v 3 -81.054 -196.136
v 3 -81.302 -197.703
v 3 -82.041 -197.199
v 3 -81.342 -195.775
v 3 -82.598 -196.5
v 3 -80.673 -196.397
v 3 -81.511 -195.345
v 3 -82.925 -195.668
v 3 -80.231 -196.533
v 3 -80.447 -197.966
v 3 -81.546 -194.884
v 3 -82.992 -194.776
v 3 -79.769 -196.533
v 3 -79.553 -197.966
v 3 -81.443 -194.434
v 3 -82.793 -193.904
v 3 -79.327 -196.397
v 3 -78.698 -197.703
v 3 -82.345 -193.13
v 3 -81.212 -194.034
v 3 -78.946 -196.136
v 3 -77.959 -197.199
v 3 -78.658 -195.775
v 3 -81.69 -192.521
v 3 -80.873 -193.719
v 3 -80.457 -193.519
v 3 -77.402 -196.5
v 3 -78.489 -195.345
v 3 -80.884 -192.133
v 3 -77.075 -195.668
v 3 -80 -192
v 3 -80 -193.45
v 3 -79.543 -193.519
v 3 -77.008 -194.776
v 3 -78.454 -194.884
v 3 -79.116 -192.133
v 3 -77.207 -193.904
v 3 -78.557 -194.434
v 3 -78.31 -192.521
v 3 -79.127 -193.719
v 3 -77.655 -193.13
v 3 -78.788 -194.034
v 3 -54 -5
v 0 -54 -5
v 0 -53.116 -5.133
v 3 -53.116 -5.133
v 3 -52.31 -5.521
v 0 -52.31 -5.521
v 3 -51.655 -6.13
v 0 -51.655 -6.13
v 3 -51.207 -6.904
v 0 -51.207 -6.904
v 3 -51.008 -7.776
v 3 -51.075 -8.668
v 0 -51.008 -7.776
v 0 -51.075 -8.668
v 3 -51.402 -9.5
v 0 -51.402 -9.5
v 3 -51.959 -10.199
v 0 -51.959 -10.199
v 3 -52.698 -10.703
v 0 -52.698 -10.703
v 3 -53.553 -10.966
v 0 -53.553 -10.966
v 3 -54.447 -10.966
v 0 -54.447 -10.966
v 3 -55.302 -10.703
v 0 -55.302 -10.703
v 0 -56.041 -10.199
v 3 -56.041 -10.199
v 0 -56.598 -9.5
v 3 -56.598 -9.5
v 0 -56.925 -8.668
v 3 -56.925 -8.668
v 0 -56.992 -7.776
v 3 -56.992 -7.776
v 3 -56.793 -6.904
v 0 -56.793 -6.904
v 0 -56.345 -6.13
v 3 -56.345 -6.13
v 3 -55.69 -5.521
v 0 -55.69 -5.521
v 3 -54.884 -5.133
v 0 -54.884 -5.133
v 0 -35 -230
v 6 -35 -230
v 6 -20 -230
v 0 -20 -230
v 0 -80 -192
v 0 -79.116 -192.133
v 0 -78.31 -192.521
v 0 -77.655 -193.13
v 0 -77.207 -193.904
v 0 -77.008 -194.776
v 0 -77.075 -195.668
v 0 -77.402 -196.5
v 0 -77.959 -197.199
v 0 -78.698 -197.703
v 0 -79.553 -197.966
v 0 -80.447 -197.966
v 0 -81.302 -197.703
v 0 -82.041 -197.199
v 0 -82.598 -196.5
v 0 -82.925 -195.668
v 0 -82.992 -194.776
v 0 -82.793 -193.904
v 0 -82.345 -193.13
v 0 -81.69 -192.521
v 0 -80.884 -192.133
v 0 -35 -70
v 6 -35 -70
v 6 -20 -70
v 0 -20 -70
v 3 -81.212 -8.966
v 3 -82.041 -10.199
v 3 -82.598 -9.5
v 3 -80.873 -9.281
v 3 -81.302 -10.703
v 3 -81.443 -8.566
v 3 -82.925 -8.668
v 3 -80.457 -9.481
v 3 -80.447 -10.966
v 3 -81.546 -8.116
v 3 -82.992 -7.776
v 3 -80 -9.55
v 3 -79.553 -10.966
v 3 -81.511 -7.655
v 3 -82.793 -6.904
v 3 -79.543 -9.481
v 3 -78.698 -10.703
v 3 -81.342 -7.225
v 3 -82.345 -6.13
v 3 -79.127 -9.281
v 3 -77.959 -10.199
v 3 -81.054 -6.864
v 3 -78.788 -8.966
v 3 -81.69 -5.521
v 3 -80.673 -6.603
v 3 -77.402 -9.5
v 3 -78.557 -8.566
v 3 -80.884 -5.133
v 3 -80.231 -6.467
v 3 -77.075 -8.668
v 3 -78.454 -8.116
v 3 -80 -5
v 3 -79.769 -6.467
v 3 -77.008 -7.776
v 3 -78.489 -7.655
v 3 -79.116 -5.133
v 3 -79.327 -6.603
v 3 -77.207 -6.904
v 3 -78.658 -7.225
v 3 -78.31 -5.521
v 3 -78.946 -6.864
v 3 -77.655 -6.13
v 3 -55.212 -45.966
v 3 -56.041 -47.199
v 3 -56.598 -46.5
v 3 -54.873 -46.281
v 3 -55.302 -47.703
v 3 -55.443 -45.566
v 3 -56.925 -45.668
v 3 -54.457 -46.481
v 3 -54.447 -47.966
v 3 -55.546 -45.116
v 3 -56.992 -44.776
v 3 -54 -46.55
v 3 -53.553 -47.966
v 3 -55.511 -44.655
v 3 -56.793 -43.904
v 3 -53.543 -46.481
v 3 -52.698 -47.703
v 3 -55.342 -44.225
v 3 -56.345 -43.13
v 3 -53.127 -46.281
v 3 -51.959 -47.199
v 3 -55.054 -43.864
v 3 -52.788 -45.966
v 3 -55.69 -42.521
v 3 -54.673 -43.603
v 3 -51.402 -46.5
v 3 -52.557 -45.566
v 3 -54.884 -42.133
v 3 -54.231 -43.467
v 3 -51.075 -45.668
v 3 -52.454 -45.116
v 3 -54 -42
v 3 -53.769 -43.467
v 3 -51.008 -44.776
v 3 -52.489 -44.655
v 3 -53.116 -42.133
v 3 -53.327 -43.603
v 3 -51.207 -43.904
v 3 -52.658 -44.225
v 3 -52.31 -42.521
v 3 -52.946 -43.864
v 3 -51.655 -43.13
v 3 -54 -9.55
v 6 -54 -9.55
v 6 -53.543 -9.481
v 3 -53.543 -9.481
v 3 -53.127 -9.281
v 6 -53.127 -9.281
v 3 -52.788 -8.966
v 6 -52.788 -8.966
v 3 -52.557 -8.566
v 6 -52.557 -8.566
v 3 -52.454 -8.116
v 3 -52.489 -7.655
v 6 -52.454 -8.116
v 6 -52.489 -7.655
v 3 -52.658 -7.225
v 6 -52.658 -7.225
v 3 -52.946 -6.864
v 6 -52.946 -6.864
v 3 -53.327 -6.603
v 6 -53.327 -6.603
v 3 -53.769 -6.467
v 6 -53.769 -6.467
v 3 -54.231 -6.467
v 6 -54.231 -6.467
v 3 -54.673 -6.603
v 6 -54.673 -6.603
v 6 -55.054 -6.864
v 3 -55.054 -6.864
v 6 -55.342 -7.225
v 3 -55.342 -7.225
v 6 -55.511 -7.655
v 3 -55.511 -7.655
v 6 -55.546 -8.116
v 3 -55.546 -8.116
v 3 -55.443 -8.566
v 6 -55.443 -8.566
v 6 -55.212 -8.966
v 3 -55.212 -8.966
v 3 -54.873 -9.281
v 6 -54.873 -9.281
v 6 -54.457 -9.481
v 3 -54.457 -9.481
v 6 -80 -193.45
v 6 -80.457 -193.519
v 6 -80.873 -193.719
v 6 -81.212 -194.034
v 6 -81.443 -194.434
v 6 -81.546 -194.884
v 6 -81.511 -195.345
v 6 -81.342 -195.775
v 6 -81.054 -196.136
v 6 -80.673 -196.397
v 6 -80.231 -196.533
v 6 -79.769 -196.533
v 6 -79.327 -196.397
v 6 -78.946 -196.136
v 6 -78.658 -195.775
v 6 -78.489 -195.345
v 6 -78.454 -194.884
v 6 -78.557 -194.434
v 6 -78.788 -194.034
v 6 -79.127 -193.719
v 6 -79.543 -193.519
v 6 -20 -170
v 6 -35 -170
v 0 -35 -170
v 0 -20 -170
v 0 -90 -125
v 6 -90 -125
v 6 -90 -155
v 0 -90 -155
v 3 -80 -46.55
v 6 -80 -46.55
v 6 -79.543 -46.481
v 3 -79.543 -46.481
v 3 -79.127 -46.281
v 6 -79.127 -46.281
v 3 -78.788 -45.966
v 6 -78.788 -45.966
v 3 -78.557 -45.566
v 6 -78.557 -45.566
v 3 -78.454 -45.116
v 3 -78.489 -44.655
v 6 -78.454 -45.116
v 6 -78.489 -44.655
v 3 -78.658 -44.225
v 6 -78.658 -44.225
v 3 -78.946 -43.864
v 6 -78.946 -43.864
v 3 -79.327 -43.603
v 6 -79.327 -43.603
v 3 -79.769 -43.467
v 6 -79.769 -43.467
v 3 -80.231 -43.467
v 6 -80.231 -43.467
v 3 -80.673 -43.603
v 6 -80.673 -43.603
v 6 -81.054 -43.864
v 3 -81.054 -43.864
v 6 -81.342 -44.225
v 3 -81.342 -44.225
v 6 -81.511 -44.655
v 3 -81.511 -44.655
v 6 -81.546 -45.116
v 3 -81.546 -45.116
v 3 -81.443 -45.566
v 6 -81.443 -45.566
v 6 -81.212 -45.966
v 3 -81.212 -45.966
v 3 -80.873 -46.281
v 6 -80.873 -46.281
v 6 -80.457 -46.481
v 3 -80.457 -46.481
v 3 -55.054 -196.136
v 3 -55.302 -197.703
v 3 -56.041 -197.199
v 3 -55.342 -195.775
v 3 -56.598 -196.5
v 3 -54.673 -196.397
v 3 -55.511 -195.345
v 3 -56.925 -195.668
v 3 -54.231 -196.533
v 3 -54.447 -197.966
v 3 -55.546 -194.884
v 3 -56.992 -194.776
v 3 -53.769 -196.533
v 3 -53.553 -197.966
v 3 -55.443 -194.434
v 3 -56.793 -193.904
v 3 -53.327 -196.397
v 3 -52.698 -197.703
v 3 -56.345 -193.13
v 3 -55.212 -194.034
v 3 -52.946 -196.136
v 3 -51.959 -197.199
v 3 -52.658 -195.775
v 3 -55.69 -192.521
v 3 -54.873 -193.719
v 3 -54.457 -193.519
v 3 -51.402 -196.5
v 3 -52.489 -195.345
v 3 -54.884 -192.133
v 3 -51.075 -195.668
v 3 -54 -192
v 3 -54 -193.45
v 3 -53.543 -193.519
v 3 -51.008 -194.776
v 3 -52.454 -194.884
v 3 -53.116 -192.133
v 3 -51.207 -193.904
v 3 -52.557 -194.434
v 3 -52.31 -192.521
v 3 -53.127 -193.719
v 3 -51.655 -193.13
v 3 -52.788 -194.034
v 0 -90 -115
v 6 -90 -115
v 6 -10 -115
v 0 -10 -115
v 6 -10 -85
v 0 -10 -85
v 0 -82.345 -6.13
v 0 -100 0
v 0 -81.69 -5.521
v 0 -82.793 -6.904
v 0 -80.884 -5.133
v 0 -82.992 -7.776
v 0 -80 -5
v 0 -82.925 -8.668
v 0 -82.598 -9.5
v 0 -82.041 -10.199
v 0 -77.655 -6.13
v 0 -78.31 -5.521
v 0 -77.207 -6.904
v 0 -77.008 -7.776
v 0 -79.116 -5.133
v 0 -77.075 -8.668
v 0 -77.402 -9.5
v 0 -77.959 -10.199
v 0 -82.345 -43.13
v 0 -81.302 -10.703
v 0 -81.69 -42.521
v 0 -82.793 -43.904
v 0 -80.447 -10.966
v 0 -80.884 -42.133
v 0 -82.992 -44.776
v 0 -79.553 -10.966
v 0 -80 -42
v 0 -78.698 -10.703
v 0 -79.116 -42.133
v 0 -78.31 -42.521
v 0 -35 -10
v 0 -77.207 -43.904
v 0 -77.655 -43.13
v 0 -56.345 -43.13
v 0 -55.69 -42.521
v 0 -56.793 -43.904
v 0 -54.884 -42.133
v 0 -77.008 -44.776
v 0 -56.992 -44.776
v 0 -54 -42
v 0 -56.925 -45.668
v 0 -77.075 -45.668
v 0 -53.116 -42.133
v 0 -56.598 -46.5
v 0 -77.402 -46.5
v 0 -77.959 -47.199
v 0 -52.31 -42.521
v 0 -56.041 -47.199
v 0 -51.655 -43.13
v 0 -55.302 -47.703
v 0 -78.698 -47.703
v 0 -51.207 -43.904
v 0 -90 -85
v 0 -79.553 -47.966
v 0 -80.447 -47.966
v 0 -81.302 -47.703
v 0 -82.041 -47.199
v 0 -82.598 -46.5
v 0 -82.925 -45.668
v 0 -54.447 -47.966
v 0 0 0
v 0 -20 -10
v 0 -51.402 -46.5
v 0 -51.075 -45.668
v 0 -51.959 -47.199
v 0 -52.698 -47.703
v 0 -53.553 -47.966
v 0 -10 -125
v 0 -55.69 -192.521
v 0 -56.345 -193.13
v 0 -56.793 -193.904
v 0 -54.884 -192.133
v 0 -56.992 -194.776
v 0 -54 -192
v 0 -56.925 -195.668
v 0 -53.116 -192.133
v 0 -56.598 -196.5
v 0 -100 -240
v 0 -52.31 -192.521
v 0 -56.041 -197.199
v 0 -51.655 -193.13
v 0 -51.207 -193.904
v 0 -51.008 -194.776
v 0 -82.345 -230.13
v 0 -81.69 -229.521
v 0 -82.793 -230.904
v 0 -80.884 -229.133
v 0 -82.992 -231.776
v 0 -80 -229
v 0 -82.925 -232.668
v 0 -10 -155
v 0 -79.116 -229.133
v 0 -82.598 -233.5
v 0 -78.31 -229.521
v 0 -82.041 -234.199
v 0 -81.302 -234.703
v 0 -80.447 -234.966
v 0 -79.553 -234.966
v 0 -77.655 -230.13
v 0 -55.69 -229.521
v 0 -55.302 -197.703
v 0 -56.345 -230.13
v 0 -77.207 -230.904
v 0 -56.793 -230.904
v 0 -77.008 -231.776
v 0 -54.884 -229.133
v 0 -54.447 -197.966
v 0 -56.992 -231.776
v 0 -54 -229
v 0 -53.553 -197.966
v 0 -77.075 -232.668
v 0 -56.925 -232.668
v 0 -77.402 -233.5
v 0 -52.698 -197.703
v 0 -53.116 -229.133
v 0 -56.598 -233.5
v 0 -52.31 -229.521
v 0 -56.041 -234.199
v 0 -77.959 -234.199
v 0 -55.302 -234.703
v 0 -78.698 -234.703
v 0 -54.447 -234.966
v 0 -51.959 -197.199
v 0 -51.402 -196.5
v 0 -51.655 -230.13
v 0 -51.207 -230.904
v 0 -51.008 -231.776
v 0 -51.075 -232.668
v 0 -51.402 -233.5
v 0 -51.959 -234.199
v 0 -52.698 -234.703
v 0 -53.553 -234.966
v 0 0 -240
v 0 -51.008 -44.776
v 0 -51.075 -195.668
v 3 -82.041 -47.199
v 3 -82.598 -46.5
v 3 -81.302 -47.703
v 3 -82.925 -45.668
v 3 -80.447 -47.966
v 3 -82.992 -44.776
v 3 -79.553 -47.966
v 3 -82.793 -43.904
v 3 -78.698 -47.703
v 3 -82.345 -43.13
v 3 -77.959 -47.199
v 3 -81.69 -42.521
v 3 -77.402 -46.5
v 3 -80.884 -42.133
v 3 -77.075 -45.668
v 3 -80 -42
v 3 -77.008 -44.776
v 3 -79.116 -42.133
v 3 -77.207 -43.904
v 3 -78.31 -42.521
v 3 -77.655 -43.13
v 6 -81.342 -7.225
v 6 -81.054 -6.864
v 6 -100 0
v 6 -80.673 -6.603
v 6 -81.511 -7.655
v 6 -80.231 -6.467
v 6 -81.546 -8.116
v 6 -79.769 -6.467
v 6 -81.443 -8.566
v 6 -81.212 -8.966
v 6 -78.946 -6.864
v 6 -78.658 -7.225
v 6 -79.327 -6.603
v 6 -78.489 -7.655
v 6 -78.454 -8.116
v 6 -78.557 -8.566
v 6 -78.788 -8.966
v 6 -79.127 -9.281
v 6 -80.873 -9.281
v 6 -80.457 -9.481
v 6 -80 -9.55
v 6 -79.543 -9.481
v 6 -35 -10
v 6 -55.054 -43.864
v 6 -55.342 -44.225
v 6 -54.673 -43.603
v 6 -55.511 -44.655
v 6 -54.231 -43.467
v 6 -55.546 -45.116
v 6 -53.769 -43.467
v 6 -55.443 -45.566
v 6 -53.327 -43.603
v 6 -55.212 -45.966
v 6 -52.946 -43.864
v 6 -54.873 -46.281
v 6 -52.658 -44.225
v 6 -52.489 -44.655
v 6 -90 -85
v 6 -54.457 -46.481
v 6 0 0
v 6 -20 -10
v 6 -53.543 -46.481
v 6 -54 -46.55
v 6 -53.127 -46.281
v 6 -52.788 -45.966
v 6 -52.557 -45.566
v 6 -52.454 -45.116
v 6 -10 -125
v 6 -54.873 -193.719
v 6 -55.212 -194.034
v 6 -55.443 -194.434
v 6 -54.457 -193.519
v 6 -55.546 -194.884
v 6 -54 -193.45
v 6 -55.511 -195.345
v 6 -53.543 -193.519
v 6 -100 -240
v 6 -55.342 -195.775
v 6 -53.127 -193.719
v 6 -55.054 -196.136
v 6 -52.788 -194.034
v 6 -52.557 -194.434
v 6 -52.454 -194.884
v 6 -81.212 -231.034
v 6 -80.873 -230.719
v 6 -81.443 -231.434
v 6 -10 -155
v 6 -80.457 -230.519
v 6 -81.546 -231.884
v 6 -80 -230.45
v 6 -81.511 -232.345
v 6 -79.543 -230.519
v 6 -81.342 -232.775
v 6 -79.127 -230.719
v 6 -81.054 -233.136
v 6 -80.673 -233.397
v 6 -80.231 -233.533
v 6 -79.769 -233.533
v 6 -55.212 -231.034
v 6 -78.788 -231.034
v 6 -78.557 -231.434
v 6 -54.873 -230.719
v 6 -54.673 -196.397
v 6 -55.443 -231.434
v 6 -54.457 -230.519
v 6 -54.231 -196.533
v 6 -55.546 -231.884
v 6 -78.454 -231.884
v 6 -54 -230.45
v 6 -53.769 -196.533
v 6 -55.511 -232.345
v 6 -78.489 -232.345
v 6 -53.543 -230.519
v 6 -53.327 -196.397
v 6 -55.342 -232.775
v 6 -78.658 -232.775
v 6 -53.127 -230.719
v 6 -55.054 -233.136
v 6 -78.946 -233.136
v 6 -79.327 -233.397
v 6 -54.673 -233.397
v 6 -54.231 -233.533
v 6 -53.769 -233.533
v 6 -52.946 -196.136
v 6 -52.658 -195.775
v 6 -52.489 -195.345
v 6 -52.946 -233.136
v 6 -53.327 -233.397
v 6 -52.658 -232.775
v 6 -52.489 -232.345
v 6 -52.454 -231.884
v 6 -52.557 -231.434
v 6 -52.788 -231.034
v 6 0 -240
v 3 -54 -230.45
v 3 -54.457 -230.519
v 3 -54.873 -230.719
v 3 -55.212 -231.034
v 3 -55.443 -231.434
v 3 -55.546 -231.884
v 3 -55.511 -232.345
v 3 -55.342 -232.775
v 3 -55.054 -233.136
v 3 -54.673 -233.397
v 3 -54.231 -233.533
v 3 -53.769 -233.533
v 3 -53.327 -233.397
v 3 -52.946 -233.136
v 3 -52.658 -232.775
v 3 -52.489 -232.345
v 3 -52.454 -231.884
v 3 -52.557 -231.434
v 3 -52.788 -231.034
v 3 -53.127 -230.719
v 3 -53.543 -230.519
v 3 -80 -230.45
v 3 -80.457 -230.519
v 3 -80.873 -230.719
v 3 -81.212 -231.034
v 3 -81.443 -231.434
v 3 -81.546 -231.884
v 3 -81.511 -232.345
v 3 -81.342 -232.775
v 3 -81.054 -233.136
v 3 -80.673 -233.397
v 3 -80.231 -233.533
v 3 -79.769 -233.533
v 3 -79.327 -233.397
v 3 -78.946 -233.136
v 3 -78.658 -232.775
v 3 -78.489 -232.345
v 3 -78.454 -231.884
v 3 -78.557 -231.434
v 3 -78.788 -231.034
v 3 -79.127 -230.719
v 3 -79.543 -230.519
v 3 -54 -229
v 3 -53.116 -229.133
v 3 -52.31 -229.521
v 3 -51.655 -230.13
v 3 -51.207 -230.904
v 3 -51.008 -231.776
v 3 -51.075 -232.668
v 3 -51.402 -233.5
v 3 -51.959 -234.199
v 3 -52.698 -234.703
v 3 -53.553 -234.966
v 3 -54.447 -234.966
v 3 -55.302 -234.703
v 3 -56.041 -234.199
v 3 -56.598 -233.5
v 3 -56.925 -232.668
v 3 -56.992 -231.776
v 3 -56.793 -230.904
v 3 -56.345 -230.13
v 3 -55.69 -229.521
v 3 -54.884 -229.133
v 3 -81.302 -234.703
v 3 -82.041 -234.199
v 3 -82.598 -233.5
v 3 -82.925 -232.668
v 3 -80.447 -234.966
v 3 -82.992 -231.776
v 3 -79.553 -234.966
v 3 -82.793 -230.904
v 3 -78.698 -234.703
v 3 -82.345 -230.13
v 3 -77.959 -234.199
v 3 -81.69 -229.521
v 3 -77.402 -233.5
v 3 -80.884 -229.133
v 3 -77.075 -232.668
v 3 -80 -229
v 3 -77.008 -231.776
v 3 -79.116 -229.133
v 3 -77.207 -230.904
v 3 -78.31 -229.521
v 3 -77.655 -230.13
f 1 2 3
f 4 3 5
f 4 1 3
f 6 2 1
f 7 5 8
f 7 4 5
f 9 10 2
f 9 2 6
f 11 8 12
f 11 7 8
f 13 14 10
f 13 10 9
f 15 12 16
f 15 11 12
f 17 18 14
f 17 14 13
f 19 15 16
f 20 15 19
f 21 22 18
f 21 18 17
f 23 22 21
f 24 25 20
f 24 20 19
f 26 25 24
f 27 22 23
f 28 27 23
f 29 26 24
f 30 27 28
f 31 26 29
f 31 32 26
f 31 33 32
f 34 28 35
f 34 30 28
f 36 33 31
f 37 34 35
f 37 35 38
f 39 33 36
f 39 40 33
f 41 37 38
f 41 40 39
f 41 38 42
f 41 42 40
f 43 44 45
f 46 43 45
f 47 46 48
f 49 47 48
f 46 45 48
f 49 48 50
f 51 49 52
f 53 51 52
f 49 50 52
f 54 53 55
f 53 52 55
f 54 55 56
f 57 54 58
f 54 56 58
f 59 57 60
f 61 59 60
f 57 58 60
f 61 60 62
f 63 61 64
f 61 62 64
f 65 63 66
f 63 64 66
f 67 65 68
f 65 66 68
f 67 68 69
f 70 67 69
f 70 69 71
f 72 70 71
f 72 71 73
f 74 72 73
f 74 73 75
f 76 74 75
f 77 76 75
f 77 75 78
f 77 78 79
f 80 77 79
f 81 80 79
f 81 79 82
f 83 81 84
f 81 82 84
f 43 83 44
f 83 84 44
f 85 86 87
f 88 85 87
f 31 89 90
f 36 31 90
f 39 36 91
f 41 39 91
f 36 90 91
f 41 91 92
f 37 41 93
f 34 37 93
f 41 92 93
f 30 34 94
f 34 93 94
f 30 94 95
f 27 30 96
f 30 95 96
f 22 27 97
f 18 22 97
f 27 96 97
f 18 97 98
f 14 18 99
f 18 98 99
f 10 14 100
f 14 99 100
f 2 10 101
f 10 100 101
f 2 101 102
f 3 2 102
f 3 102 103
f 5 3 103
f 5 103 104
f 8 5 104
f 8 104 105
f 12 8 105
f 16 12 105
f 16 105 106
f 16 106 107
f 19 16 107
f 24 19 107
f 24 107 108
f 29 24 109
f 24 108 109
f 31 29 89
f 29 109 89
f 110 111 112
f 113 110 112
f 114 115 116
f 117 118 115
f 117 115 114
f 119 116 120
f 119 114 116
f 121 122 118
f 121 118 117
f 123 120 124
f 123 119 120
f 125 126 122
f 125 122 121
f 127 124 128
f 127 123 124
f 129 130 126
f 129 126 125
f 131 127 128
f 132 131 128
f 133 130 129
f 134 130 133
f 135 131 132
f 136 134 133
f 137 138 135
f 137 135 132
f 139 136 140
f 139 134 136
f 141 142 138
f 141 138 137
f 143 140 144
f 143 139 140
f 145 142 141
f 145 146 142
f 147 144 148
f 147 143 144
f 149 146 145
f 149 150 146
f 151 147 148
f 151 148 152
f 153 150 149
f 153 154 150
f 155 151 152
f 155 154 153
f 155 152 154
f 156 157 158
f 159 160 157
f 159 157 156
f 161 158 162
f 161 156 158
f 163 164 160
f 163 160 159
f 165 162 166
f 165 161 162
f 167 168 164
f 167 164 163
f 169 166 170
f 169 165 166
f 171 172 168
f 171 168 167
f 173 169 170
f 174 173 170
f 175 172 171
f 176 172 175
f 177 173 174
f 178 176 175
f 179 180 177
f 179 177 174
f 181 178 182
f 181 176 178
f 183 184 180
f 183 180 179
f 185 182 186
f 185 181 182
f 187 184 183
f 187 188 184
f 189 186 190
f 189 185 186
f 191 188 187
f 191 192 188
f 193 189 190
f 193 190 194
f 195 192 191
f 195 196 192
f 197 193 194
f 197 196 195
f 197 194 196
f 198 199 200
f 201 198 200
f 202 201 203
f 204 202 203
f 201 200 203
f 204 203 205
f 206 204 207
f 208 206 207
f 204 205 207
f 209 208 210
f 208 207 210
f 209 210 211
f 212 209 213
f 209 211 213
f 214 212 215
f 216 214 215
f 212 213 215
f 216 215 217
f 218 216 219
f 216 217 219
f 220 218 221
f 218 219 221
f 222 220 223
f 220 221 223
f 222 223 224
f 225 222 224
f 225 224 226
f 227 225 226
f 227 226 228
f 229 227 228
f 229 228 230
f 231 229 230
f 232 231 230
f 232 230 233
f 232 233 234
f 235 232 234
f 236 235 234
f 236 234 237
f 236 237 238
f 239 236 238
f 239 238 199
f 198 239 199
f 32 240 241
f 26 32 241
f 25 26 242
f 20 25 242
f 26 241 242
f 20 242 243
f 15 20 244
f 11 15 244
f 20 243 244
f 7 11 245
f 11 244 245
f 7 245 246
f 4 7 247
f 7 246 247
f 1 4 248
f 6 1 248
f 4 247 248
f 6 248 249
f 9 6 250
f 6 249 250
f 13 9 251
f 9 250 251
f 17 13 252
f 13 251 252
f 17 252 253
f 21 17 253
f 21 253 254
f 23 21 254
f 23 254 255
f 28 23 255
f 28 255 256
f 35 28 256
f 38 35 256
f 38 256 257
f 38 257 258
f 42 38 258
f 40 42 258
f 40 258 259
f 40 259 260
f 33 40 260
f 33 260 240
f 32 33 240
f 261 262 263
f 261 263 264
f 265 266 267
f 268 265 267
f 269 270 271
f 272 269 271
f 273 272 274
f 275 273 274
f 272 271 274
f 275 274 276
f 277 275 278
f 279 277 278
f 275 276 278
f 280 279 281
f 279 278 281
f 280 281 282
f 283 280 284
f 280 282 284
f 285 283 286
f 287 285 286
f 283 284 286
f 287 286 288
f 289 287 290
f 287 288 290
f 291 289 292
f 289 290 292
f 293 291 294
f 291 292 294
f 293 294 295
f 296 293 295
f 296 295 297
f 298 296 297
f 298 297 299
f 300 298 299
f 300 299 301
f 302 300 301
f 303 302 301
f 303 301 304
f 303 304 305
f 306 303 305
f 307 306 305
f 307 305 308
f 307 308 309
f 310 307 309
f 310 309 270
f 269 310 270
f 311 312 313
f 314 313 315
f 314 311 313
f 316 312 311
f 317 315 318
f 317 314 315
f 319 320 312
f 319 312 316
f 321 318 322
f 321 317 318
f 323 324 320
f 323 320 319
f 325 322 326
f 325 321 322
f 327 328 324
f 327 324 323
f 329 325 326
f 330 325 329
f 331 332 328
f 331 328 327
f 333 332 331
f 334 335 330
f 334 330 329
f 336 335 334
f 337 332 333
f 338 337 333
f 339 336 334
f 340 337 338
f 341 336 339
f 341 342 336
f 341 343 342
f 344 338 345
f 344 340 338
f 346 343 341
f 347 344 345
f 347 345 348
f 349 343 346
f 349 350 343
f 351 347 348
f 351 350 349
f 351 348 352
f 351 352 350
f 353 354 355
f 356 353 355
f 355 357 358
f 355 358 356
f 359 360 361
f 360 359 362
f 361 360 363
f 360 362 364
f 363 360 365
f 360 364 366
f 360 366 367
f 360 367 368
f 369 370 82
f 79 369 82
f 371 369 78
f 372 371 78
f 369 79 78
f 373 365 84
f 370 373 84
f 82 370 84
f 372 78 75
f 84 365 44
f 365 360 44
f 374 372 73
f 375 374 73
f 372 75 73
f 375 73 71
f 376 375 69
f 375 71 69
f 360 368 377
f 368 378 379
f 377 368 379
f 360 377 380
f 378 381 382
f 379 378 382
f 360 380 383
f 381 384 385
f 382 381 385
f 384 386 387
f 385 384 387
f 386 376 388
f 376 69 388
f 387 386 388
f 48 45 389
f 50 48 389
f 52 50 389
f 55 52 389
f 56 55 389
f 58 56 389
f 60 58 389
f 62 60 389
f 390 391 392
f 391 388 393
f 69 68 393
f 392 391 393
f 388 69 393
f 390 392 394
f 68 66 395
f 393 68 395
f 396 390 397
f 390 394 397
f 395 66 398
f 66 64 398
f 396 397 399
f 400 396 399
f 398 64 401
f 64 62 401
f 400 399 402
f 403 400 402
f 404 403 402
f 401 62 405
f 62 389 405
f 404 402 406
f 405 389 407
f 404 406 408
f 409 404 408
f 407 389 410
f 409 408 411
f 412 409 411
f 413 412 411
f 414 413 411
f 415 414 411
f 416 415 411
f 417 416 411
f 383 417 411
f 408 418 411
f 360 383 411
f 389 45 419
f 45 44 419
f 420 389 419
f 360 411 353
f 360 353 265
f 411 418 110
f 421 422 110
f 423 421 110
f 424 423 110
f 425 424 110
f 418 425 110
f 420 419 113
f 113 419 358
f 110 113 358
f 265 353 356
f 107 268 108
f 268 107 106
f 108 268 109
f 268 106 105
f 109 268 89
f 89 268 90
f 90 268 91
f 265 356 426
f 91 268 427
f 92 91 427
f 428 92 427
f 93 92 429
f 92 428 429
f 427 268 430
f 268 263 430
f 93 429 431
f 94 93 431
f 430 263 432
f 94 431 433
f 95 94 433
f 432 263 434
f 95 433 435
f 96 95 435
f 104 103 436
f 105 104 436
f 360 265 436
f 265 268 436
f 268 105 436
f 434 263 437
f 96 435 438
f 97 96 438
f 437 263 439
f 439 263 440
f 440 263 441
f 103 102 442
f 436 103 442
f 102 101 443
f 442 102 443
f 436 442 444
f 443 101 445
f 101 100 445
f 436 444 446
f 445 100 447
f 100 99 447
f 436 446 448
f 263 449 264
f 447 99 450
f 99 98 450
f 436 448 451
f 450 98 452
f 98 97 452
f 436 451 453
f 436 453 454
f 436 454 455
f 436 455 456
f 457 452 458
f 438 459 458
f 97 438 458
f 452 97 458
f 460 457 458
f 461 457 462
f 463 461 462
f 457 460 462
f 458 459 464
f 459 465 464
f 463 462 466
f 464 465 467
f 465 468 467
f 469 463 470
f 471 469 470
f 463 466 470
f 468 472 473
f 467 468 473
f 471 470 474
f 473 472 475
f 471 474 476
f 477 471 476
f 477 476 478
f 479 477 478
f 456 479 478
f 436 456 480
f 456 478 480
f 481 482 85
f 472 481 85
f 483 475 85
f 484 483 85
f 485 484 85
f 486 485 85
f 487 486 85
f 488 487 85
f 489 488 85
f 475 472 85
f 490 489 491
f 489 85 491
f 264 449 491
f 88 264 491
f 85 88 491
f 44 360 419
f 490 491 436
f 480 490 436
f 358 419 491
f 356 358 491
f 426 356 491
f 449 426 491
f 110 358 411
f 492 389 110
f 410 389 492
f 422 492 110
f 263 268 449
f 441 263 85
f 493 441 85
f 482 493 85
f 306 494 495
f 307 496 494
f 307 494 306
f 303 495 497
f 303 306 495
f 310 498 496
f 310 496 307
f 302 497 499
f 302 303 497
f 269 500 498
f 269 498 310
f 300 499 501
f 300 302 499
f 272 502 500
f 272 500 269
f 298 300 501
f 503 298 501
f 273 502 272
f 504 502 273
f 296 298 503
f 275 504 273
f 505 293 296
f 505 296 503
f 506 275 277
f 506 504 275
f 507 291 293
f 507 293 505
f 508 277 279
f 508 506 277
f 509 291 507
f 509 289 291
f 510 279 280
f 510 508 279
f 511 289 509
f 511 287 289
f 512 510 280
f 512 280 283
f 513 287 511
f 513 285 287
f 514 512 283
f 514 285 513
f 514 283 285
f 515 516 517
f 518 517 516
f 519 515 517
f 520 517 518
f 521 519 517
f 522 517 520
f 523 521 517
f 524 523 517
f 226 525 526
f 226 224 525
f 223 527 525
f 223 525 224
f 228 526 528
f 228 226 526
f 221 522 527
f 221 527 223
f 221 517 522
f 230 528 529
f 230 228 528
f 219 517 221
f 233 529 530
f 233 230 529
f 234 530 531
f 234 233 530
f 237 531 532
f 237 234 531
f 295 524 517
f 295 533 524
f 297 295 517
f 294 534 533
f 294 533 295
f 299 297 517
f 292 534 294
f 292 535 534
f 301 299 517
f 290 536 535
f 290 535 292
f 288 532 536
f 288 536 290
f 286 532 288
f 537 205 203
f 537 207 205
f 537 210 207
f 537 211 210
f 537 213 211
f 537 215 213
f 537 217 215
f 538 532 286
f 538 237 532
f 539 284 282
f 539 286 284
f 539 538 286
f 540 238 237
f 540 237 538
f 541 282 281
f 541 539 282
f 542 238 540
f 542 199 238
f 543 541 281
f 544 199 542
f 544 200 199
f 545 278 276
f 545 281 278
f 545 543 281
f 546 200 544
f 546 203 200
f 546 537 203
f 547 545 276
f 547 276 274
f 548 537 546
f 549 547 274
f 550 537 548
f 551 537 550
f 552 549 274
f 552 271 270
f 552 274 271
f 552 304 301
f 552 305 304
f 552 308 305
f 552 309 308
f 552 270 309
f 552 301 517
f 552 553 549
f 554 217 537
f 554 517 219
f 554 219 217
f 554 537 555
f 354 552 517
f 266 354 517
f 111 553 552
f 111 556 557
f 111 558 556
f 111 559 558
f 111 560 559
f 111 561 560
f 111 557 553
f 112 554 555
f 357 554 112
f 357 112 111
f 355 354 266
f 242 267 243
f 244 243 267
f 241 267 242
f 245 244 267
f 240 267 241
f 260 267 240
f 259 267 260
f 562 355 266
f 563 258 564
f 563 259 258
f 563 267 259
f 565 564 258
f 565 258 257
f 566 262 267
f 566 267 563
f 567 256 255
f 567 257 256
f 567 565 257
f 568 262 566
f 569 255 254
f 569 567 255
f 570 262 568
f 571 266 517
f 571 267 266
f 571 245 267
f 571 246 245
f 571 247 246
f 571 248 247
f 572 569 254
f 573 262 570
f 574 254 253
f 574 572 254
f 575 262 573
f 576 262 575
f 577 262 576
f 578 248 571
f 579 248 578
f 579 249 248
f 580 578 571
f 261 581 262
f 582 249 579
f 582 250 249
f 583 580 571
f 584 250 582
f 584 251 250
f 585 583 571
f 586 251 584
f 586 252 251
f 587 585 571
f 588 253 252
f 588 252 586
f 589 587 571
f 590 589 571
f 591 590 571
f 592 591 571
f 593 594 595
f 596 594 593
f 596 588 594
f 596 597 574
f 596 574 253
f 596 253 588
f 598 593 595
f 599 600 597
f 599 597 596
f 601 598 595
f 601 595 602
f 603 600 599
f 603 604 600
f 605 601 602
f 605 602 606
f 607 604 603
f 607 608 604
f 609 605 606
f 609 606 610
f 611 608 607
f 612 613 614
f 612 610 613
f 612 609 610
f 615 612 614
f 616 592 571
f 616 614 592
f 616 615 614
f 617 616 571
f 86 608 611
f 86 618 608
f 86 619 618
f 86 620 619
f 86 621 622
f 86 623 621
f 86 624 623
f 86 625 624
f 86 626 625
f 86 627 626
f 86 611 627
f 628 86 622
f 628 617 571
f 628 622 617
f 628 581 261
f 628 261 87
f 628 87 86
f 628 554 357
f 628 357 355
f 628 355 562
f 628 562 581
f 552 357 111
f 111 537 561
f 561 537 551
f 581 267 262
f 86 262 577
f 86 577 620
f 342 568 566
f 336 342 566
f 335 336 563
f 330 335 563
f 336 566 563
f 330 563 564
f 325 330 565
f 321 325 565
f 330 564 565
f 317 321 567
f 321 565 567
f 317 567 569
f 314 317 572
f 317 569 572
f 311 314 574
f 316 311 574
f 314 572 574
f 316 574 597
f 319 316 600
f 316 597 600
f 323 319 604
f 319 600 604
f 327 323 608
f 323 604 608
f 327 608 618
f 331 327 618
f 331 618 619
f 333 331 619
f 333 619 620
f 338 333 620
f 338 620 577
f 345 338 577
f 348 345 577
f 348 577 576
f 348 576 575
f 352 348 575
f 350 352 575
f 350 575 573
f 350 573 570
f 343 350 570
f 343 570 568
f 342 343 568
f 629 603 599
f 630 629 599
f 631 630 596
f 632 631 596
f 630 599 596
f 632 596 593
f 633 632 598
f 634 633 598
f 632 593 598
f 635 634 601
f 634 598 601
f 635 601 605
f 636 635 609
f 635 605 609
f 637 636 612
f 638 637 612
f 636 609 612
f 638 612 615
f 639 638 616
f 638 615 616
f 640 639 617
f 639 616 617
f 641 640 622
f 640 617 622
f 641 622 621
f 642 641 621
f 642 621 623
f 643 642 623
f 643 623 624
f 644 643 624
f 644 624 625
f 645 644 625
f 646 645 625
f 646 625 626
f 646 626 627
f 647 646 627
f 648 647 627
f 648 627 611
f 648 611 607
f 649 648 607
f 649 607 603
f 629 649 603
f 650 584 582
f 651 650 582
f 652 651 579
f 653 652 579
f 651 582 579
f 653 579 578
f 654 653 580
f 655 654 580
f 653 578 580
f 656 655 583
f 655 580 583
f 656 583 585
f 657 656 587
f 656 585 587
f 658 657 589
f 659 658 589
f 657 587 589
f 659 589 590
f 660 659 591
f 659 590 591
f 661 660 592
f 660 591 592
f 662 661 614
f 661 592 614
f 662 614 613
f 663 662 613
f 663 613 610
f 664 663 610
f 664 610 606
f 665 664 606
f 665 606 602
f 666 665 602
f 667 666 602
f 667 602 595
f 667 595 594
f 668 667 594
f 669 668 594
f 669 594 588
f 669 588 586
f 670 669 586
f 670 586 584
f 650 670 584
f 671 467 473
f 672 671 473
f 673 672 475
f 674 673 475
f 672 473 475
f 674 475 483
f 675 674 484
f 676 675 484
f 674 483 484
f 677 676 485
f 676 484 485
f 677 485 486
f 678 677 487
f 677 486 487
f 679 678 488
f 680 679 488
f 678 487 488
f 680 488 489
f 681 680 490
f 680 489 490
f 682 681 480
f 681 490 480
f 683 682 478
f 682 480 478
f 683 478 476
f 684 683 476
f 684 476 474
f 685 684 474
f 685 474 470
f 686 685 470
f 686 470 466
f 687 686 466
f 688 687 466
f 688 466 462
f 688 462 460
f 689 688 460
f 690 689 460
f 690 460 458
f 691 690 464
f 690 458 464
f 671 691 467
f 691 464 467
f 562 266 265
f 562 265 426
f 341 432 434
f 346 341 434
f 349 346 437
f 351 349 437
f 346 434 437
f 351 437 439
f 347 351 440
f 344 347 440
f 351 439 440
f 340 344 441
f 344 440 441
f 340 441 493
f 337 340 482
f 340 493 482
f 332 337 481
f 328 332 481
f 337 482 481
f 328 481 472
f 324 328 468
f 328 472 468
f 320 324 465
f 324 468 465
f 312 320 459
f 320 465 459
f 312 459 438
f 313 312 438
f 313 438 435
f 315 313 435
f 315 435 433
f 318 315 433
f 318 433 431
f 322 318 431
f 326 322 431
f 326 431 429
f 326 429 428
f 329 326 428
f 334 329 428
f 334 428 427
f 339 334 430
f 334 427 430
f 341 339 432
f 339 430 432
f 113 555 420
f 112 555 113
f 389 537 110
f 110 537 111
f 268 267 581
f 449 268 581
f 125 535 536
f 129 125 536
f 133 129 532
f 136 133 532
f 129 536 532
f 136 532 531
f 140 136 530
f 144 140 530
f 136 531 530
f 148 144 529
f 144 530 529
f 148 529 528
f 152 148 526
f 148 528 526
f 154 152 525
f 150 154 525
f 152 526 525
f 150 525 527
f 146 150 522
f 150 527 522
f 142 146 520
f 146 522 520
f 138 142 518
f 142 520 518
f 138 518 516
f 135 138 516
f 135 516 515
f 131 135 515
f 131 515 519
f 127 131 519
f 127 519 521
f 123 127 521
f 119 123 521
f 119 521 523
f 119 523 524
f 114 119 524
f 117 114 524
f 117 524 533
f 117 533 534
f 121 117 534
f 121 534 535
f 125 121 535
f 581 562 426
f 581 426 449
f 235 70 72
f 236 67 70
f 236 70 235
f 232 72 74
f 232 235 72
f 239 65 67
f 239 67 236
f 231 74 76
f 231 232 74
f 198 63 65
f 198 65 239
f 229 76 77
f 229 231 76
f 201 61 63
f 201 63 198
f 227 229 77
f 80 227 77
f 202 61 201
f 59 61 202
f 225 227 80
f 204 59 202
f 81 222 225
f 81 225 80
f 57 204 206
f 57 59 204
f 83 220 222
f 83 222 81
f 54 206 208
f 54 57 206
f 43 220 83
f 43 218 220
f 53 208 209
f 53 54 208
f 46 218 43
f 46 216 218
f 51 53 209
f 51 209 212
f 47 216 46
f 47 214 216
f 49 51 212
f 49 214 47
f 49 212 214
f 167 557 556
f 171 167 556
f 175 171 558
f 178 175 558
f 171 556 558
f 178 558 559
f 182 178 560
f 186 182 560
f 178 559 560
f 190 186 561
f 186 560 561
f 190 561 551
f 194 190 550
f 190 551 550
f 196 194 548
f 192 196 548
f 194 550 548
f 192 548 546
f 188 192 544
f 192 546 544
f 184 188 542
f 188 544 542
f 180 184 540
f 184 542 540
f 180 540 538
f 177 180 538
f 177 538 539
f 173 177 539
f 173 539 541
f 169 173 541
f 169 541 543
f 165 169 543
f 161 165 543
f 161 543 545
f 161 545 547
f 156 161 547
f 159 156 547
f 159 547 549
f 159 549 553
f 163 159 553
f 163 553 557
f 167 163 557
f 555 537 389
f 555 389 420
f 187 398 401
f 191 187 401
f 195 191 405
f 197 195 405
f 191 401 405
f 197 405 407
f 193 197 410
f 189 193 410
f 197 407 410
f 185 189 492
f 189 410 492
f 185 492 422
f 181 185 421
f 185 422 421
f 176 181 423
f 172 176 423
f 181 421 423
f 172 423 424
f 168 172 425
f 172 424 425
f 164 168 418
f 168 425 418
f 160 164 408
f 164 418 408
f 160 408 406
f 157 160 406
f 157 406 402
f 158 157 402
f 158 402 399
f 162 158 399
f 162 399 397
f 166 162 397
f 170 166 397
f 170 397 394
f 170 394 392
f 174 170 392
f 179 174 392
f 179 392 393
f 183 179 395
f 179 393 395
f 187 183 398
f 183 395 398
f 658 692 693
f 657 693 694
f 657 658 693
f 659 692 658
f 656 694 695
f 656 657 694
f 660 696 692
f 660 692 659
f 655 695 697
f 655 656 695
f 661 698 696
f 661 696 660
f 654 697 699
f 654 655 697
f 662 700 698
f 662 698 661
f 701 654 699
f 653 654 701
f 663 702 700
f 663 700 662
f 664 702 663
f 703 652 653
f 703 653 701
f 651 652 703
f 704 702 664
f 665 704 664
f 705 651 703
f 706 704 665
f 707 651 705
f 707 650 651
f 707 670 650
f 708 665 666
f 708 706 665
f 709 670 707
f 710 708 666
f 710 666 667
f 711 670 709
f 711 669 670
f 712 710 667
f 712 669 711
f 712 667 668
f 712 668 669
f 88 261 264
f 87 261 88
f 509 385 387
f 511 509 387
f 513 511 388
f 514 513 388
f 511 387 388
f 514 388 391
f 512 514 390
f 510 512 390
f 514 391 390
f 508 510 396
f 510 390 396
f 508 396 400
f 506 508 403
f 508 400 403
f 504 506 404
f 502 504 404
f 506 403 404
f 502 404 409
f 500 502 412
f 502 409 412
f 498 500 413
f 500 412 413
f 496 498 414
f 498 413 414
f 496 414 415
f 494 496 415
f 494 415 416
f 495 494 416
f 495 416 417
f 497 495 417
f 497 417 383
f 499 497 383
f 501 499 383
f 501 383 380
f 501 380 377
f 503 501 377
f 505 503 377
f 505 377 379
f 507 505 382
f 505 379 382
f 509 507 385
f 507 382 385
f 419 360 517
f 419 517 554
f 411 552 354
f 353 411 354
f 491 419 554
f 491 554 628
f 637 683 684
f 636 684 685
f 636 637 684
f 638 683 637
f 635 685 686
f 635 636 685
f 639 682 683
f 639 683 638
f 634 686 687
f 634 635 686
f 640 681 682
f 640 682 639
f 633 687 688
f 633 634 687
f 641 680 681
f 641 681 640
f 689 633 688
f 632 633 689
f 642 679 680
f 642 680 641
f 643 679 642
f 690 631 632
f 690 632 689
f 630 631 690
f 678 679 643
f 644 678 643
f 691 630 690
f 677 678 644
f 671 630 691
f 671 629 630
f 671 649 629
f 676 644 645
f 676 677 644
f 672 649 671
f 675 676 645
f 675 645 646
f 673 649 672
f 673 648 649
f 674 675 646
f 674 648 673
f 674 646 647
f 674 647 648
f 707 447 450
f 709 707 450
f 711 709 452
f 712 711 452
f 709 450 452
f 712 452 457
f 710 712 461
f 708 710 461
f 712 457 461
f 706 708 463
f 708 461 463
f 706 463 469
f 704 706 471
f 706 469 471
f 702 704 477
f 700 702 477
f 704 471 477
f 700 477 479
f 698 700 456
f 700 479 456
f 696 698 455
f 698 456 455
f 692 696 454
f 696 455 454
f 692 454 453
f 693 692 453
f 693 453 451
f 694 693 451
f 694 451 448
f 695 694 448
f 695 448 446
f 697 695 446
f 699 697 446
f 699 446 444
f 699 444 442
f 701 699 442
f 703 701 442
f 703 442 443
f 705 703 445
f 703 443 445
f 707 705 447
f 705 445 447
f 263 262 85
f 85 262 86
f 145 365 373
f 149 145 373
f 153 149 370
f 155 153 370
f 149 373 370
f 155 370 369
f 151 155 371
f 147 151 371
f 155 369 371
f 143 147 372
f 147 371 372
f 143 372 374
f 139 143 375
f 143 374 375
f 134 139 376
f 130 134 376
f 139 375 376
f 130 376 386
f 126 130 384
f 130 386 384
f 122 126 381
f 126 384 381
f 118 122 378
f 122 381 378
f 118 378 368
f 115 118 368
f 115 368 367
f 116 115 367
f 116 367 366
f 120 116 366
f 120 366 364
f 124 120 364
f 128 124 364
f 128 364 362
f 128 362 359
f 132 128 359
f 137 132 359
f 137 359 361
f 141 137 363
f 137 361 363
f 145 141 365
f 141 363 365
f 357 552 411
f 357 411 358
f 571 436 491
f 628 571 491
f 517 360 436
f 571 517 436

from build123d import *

# Parameters (mm, degrees)
SKETCH_1_W          = 240
SKETCH_1_H          = 100
EXTRUDE_1_DEPTH     = 6
SKETCH_2_R          = 1.55
CUT_EXTRUDE_1_DEPTH = 261.069221555
SKETCH_3_W          = 60
SKETCH_3_H          = 15
CUT_EXTRUDE_2_DEPTH = 261.069221555
SKETCH_4_W          = 30
SKETCH_4_H          = 80
CUT_EXTRUDE_3_DEPTH = 261.069221555
SKETCH_5_R          = 3
CUT_EXTRUDE_4_DEPTH = 3


with BuildPart() as part:
    # 草图1 → 凸台-拉伸1 (new body)
    with BuildSketch(Plane(origin=(0, 0, 0), x_dir=(0, 0, -1), z_dir=(1, 0, 0))):
        with Locations((120, -50)):
            Rectangle(SKETCH_1_W, SKETCH_1_H)
    extrude(amount=EXTRUDE_1_DEPTH)

    # 草图2 → 切除-拉伸1 (cut, through all)
    with BuildSketch(Plane(origin=(6, 0, 0), x_dir=(0, 0, -1), z_dir=(1, 0, 0))):
        with Locations((8, -54)):
            Circle(SKETCH_2_R)
        with Locations((45, -80)):
            Circle(SKETCH_2_R)
        with Locations((45, -54)):
            Circle(SKETCH_2_R)
        with Locations((8, -80)):
            Circle(SKETCH_2_R)
        with Locations(Location((232, -80, 0), (0, 0, 180))):
            Circle(SKETCH_2_R)
        with Locations(Location((195, -54, 0), (0, 0, 180))):
            Circle(SKETCH_2_R)
        with Locations(Location((195, -80, 0), (0, 0, 180))):
            Circle(SKETCH_2_R)
        with Locations(Location((232, -54, 0), (0, 0, 180))):
            Circle(SKETCH_2_R)
    extrude(amount=-CUT_EXTRUDE_1_DEPTH, mode=Mode.SUBTRACT)

    # 草图3 → 切除-拉伸2 (cut, through all)
    with BuildSketch(Plane(origin=(6, 0, 0), x_dir=(0, 0, -1), z_dir=(1, 0, 0))):
        with Locations((40, -27.5)):
            Rectangle(SKETCH_3_W, SKETCH_3_H)
        with Locations((200, -27.5)):
            Rectangle(SKETCH_3_W, SKETCH_3_H)
    extrude(amount=-CUT_EXTRUDE_2_DEPTH, mode=Mode.SUBTRACT)

    # 草图4 → 切除-拉伸3 (cut, through all)
    with BuildSketch(Plane(origin=(6, 0, 0), x_dir=(0, 0, -1), z_dir=(1, 0, 0))):
        with Locations((100, -50)):
            Rectangle(SKETCH_4_W, SKETCH_4_H)
        with Locations((140, -50)):
            Rectangle(SKETCH_4_W, SKETCH_4_H)
    extrude(amount=-CUT_EXTRUDE_3_DEPTH, mode=Mode.SUBTRACT)

    # 草图5 → 切除-拉伸4 (cut)
    with BuildSketch(Plane.ZY):
        with Locations((-195, -80)):
            Circle(SKETCH_5_R)
        with Locations((-232, -80)):
            Circle(SKETCH_5_R)
        with Locations((-195, -54)):
            Circle(SKETCH_5_R)
        with Locations((-232, -54)):
            Circle(SKETCH_5_R)
        with Locations((-45, -80)):
            Circle(SKETCH_5_R)
        with Locations((-8, -80)):
            Circle(SKETCH_5_R)
        with Locations((-8, -54)):
            Circle(SKETCH_5_R)
        with Locations((-45, -54)):
            Circle(SKETCH_5_R)
    extrude(amount=-CUT_EXTRUDE_4_DEPTH, mode=Mode.SUBTRACT)


solid = part.part
